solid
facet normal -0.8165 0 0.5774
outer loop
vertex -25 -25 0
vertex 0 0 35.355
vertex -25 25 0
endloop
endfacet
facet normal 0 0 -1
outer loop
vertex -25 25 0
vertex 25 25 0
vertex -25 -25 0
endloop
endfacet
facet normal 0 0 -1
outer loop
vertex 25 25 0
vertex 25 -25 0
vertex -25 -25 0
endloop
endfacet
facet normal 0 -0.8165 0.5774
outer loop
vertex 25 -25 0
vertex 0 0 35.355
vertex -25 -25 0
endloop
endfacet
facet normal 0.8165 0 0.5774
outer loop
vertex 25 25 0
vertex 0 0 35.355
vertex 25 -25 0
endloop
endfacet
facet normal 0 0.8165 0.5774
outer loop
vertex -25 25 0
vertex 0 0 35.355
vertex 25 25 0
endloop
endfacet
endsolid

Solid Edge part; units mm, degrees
sketch "Sketch1" plane through (0, 0, 0) normal (0, -1, 0) x (1, 0, 0)
  arc A0 (-75, 0) -> (0, 75) centre (0, 0) cw
  line L0 (0, 0) -> (0, 75)
  line L1 (-75, 0) -> (0, 0)
revolve "RevolvedProtrusion1" add sketch "Sketch1" angle 360 about axis through (0, 0, 0) along (0, 0, 1)
sketch "Sketch2" plane through (0, 0, 0) normal (0, -1, 0) x (1, 0, 0)
  line L0 (0, 35.3553) -> (25, 0)
  line L1 (0, 35.3553) -> (-25, 0)
extrude "Cutout1" cut sketch "Sketch2" along normal through all and the other way through all material side at (12.5408, 0, 17.7065)
pattern_circular "Pattern1" count 4 over 360 about axis through (0, 0, 0) along (0, 0, 1) of "Cutout1"
